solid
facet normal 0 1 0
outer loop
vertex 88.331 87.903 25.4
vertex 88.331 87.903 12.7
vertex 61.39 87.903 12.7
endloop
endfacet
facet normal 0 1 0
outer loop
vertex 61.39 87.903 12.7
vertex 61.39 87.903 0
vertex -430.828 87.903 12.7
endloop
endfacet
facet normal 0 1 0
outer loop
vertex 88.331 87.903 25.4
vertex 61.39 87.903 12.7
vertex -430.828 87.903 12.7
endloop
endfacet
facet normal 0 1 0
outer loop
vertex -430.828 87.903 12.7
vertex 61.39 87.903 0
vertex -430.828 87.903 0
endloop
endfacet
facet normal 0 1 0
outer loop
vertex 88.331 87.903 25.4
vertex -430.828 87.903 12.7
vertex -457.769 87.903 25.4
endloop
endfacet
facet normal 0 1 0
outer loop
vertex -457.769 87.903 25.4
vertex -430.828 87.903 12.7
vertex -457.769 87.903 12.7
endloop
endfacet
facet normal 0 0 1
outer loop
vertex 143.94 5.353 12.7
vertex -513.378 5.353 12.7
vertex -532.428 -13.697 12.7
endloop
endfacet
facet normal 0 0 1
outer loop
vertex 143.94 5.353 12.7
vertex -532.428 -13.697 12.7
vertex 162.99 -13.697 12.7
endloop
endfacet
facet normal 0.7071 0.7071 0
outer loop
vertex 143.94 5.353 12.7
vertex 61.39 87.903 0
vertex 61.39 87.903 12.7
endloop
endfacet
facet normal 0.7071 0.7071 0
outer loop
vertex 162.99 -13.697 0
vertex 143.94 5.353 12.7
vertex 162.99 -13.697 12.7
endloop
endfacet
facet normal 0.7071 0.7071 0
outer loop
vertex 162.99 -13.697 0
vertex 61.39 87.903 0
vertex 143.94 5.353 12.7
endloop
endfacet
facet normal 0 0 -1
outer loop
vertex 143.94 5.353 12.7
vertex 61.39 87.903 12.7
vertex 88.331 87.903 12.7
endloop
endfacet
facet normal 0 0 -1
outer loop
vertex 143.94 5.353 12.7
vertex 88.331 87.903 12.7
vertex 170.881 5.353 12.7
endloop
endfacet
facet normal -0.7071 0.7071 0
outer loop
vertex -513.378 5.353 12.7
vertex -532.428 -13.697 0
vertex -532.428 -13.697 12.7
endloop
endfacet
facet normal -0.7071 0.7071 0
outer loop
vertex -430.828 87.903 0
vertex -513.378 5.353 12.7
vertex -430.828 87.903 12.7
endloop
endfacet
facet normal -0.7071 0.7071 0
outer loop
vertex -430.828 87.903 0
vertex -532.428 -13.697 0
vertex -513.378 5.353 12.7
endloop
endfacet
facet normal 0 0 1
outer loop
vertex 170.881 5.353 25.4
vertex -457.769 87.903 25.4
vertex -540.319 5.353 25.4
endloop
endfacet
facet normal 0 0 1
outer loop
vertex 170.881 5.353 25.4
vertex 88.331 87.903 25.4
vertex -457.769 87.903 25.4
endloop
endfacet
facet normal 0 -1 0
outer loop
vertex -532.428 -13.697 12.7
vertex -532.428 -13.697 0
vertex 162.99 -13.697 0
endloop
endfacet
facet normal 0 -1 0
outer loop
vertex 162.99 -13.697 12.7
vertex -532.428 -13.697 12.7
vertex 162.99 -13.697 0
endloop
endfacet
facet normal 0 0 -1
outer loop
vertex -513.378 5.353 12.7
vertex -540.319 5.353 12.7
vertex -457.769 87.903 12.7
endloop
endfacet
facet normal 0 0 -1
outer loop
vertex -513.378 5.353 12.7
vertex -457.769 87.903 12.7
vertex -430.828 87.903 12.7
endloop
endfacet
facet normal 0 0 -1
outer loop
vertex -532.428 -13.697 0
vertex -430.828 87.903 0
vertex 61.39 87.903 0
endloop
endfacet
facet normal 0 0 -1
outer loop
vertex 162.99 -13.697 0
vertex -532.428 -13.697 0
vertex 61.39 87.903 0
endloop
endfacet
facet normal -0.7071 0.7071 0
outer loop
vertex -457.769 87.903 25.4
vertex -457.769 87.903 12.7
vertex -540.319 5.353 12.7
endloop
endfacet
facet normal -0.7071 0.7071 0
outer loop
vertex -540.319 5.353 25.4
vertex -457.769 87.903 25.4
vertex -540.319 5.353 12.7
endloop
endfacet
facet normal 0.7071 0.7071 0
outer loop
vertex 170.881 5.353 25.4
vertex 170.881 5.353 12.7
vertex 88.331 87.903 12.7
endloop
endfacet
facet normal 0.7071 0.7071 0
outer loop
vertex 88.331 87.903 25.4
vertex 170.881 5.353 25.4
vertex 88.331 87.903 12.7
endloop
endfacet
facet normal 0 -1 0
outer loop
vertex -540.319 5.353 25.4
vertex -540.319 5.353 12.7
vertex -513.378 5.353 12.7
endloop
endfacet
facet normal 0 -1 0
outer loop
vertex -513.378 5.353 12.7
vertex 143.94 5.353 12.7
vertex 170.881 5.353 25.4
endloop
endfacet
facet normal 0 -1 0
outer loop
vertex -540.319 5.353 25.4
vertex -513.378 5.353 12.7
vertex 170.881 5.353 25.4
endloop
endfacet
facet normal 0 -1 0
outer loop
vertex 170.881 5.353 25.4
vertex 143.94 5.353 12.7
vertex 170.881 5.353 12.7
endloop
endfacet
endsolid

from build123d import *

# Parameters (mm, degrees)
F1_DEPTH = 12.7
F2_DEPTH = 25.4
F3_DEPTH = 12.7


with BuildPart() as f1:
    # F0 (on Top) → F1 (new body)
    with BuildSketch(Plane.XY):
        Polygon((61.3904680035, 87.9025101712), (-430.82799527, 87.9025101712), (-513.37799527, 5.3525101712), (143.9404680035, 5.3525101712), align=None)
        Polygon((-430.82799527, 87.9025101712), (-457.7687636333, 87.9025101712), (-540.3187636333, 5.3525101712), (-513.37799527, 5.3525101712), align=None)
        Polygon((143.9404680035, 5.3525101712), (-513.37799527, 5.3525101712), (-532.42799527, -13.6974898288), (162.9904680035, -13.6974898288), align=None)
        Polygon((88.3312363667, 87.9025101712), (61.3904680035, 87.9025101712), (143.9404680035, 5.3525101712), (170.8812363667, 5.3525101712), align=None)
    extrude(amount=F1_DEPTH)

    # F0 (on Top) → F2 (join)
    with BuildSketch(Plane.XY):
        Polygon((61.3904680035, 87.9025101712), (-430.82799527, 87.9025101712), (-513.37799527, 5.3525101712), (143.9404680035, 5.3525101712), align=None)
        Polygon((-430.82799527, 87.9025101712), (-457.7687636333, 87.9025101712), (-540.3187636333, 5.3525101712), (-513.37799527, 5.3525101712), align=None)
        Polygon((88.3312363667, 87.9025101712), (61.3904680035, 87.9025101712), (143.9404680035, 5.3525101712), (170.8812363667, 5.3525101712), align=None)
    extrude(amount=F2_DEPTH)

    # F0 (on Top) → F3 (cut)
    with BuildSketch(Plane.XY):
        Polygon((88.3312363667, 87.9025101712), (61.3904680035, 87.9025101712), (143.9404680035, 5.3525101712), (170.8812363667, 5.3525101712), align=None)
        Polygon((-430.82799527, 87.9025101712), (-457.7687636333, 87.9025101712), (-540.3187636333, 5.3525101712), (-513.37799527, 5.3525101712), align=None)
    extrude(amount=F3_DEPTH, mode=Mode.SUBTRACT)


solid = f1.part
